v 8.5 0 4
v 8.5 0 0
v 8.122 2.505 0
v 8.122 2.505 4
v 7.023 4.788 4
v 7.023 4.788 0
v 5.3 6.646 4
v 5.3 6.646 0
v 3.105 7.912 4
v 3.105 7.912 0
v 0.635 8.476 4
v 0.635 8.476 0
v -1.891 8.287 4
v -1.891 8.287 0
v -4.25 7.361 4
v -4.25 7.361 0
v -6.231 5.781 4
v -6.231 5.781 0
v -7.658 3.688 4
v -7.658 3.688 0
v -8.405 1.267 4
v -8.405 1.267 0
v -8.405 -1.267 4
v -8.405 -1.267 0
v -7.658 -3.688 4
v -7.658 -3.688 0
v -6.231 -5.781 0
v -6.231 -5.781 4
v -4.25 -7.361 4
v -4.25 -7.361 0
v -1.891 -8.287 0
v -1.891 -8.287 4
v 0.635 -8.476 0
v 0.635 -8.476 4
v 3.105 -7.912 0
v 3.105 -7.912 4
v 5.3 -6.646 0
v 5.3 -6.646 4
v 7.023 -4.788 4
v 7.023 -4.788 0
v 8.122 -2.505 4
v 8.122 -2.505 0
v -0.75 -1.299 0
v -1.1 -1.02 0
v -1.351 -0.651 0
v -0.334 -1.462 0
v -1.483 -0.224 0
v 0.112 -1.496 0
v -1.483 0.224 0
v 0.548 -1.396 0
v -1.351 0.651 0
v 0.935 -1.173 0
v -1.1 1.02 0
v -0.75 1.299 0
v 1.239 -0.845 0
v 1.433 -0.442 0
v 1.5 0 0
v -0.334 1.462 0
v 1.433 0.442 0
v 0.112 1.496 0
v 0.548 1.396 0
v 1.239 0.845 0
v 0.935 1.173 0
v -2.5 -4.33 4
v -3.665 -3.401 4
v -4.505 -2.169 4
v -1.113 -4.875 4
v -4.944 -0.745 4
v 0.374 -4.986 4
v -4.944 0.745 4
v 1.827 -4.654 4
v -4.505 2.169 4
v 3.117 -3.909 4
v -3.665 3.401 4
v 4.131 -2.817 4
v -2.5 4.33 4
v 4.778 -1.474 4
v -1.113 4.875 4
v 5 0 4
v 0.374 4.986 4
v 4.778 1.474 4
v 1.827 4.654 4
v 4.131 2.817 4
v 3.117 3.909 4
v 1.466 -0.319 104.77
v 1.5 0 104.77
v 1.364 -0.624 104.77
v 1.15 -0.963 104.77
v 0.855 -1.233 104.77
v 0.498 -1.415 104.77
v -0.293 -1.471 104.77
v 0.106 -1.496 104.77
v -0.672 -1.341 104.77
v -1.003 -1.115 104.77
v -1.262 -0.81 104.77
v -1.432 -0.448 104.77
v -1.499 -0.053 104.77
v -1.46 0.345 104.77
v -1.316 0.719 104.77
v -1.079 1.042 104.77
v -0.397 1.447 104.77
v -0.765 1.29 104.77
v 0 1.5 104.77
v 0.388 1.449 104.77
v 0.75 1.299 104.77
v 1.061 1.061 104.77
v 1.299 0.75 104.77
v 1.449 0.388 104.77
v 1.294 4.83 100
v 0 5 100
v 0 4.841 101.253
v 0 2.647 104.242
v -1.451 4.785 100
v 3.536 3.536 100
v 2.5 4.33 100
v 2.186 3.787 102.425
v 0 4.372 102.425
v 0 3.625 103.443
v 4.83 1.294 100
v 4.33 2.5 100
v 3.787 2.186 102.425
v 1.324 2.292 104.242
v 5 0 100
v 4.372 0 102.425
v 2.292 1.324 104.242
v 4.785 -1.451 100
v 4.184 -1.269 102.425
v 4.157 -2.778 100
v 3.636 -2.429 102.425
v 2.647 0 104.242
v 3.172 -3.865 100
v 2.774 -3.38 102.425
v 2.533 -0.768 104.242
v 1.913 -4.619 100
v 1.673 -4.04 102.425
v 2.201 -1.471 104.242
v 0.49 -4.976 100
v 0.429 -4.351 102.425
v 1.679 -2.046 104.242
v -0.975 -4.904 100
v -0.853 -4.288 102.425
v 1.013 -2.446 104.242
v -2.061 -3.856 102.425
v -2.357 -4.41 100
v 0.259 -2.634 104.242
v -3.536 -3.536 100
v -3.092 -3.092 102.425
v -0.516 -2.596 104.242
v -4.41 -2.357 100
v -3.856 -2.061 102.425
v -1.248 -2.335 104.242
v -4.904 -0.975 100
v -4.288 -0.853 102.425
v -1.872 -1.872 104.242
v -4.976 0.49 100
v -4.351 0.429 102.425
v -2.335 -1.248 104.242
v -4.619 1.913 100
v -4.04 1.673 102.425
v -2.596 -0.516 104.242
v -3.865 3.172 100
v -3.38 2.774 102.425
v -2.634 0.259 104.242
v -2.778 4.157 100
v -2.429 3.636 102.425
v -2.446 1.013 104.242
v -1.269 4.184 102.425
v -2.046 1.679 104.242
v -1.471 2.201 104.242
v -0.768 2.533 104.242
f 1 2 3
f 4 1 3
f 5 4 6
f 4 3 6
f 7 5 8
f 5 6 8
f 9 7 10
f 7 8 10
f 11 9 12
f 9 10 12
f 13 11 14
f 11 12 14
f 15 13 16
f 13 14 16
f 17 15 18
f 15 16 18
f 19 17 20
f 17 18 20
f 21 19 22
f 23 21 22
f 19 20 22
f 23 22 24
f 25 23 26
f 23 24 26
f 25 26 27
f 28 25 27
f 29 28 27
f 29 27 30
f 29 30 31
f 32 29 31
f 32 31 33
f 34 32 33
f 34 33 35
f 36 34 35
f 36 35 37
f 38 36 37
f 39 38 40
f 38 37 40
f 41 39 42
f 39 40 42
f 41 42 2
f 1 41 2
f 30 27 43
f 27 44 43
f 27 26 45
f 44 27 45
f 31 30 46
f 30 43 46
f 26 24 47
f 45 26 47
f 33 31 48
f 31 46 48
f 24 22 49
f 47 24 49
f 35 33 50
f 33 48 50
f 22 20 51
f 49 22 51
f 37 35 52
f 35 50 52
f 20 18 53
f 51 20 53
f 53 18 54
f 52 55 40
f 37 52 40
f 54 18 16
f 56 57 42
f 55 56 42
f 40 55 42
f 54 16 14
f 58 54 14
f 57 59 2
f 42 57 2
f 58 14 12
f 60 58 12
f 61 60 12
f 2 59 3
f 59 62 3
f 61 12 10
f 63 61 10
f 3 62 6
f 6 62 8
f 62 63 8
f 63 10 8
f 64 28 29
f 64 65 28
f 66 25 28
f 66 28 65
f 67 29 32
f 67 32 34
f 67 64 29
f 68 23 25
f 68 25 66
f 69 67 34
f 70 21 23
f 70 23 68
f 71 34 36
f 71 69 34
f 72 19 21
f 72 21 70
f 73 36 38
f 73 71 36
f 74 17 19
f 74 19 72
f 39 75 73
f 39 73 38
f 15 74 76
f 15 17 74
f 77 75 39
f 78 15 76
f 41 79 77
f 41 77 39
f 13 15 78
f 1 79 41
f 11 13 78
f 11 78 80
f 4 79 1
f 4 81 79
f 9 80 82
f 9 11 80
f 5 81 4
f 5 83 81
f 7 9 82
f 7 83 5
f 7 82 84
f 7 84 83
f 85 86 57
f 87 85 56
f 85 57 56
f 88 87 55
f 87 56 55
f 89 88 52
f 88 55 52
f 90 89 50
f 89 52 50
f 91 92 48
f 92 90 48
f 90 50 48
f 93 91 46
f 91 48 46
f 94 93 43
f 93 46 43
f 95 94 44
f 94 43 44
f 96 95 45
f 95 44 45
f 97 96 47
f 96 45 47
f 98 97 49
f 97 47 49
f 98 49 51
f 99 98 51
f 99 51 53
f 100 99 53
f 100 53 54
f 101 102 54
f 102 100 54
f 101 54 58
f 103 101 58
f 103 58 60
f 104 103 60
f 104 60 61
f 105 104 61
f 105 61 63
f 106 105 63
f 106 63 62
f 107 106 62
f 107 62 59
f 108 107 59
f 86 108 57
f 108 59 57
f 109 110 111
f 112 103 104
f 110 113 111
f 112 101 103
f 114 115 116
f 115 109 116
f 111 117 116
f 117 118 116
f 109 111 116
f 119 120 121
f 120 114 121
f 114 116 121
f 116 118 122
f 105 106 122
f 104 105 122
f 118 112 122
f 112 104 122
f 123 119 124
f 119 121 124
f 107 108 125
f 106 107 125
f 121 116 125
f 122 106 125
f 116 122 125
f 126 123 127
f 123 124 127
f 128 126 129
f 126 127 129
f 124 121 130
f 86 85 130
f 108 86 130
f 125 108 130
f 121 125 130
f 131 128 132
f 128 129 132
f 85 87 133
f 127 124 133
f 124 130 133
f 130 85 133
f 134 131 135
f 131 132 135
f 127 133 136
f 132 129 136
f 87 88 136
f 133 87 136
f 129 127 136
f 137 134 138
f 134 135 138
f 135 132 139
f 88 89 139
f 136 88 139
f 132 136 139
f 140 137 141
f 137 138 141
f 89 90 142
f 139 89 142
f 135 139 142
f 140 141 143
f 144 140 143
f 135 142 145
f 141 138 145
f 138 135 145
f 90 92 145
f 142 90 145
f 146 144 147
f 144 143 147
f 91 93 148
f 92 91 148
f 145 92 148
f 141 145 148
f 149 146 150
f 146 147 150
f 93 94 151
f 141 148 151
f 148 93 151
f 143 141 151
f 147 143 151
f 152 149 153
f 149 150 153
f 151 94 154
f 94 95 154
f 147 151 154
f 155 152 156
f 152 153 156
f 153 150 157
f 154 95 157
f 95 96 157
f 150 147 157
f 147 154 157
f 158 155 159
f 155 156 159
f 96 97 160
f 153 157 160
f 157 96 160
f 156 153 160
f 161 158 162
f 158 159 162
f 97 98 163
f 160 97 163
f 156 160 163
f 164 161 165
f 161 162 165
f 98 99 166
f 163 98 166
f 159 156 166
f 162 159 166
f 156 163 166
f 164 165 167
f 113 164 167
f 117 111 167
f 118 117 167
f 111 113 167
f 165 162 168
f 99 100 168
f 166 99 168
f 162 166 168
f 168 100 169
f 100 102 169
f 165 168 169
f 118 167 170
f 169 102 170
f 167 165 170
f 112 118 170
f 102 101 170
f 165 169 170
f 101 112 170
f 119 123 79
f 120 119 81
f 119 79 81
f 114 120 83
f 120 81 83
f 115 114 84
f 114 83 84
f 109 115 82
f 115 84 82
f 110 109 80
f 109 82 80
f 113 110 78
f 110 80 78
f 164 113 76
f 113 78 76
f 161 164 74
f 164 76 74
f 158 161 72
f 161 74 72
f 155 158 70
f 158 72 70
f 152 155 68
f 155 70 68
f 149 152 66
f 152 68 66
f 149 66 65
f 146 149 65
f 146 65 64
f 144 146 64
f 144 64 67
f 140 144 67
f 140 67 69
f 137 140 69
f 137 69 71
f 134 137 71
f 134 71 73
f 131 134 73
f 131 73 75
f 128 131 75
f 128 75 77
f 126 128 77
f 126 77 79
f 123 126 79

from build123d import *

# Parameters (mm, degrees)
F0_R     = 8.5
F1_DEPTH = 4
F2_R     = 5
F3_DEPTH = 100
F6_R     = 1.5
F7_DEPTH = 133.7


with BuildPart() as f1:
    # F0 (on Top) → F1 (new body)
    with BuildSketch(Plane.XY):
        Circle(F0_R)
    extrude(amount=F1_DEPTH)

    # F2 (on Top) → F3 (join)
    with BuildSketch(Plane.XY):
        Circle(F2_R)
    extrude(amount=F3_DEPTH)

    # F4 (on Right) → F5 (revolve)
    with BuildSketch(Plane.YZ):
        with BuildLine():
            Line((0, 100), (5, 100))
            ThreePointArc((5, 100), (3.535534, 103.535534), (0, 105))
            Line((0, 105), (0, 100))
        make_face()
    revolve(axis=Axis((0, 0, 102.5), (0, 0, -1)))

    # F6 (on face) → F7 (cut)
    with BuildSketch(Plane(origin=(0, 0, 0), x_dir=(1, 0, 0), z_dir=(0, 0, -1))):
        Circle(F6_R)
    extrude(amount=-F7_DEPTH, mode=Mode.SUBTRACT)


solid = f1.part
